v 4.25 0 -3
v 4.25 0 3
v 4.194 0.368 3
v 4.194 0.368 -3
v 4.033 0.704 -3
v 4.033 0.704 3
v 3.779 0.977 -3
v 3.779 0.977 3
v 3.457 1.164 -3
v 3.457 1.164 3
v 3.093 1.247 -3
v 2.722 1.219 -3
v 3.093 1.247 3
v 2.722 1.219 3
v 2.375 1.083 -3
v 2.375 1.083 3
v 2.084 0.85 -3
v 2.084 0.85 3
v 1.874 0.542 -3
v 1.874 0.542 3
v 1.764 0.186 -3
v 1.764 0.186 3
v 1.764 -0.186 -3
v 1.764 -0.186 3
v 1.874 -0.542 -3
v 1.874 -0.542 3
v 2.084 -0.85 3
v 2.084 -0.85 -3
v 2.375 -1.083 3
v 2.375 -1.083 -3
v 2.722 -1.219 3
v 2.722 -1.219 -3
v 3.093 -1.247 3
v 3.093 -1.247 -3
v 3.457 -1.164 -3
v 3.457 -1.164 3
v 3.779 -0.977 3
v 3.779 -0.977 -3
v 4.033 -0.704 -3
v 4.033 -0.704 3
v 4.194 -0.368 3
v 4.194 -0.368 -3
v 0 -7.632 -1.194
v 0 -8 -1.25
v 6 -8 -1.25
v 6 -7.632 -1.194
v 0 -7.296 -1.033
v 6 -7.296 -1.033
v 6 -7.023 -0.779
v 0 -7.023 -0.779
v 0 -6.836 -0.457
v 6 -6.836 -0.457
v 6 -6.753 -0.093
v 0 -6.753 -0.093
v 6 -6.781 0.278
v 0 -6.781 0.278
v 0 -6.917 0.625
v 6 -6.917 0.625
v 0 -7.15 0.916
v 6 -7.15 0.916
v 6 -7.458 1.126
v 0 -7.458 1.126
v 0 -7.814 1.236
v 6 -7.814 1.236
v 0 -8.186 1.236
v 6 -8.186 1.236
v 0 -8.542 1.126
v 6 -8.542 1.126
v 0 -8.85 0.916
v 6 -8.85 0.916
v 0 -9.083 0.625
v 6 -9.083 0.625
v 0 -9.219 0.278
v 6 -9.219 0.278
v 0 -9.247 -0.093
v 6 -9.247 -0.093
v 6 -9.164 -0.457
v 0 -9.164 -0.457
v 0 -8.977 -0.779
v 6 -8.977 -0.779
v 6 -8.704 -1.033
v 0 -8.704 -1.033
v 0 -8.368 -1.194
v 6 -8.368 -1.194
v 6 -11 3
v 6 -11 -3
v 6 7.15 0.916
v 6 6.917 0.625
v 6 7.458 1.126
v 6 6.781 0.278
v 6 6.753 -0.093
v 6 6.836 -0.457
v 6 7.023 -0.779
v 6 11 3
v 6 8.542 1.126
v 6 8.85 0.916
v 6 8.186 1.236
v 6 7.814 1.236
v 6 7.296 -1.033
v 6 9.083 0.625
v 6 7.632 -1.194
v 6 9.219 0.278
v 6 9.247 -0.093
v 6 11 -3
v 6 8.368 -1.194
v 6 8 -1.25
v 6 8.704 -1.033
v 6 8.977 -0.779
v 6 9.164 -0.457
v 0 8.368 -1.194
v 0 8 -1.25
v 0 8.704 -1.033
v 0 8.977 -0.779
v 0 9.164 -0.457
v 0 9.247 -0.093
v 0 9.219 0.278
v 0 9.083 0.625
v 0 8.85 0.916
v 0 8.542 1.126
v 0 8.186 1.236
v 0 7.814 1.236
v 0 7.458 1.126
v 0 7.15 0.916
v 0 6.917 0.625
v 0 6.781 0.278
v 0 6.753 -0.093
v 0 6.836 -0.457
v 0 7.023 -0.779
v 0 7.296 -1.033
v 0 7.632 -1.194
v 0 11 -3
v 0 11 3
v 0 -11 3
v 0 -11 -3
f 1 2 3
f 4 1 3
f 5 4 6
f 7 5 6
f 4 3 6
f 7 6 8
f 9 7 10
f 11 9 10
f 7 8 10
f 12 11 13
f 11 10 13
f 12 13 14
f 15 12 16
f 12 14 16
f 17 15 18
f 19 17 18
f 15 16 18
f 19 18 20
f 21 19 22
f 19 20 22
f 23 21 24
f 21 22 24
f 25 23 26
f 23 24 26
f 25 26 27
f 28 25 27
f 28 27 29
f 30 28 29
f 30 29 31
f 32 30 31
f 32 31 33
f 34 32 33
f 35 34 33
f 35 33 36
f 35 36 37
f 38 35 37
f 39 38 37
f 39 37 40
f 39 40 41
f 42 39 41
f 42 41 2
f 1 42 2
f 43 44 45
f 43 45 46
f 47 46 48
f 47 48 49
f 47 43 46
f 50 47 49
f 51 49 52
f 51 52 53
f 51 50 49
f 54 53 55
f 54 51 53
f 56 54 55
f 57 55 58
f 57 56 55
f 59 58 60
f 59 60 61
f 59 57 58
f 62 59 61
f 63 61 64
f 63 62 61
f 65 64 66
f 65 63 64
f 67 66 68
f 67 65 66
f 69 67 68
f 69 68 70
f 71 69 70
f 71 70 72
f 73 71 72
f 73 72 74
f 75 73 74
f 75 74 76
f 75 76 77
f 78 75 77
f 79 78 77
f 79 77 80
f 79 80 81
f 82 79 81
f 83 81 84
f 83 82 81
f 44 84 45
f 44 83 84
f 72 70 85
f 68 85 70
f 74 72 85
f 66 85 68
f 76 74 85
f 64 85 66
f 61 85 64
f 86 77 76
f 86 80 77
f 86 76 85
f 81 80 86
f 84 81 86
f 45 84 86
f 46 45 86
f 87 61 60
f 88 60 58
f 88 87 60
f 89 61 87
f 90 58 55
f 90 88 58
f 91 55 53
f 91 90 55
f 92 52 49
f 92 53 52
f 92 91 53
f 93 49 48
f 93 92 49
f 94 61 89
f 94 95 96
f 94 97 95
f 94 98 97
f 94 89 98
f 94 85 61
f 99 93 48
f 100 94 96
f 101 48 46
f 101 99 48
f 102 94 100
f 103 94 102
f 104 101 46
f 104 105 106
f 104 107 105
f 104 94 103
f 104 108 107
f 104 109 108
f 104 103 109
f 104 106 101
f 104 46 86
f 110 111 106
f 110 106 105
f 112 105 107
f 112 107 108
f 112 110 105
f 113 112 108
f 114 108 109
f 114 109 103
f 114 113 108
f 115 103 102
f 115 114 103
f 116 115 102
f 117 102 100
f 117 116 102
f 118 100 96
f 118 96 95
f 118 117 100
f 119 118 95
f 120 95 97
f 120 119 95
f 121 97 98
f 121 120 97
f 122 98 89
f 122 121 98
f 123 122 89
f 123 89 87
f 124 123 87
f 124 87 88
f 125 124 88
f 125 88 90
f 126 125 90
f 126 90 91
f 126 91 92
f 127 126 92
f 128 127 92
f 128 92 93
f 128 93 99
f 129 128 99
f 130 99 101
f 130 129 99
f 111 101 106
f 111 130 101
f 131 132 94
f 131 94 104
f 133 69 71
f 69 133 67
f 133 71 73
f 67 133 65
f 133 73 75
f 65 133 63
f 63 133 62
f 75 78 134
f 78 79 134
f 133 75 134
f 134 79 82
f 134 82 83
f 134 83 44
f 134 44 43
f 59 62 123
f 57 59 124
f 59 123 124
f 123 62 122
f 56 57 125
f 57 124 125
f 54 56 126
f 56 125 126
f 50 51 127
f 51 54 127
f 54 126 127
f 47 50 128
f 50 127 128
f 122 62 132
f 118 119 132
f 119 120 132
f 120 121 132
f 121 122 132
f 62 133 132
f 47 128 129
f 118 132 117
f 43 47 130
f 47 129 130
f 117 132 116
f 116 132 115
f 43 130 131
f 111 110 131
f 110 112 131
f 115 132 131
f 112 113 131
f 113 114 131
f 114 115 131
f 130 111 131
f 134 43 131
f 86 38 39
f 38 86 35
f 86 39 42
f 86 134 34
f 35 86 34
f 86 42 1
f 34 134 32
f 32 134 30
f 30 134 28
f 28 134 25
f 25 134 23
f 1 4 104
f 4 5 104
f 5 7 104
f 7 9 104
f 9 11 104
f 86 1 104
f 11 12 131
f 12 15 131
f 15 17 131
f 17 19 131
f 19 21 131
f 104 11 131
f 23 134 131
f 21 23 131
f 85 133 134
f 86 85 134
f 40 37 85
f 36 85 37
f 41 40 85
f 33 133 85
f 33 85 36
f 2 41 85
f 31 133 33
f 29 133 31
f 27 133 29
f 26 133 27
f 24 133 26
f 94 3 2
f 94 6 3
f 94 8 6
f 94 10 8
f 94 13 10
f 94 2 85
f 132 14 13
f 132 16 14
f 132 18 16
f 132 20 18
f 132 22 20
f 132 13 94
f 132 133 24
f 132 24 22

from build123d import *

# Parameters (mm, degrees)
SKETCH_1_W          = 6
SKETCH_1_H          = 22
SKETCH_1_R          = 1.25
EXTRUDE_1_DEPTH     = 6
SKETCH_2_R          = 1.25
CUT_EXTRUDE_1_DEPTH = 7


with BuildPart() as part:
    # 草图1 → 凸台-拉伸1 (new body)
    with BuildSketch(Plane(origin=(0, 0, 0), x_dir=(0, 0, -1), z_dir=(1, 0, 0))):
        Rectangle(SKETCH_1_W, SKETCH_1_H)
        with Locations((0, 8)):
            Circle(SKETCH_1_R, mode=Mode.SUBTRACT)
        with Locations((0, -8)):
            Circle(SKETCH_1_R, mode=Mode.SUBTRACT)
    extrude(amount=EXTRUDE_1_DEPTH)

    # 草图2 → 切除-拉伸1 (cut, through all)
    with BuildSketch(Plane.XY.offset(3)):
        with Locations((3, 0)):
            Circle(SKETCH_2_R)
    extrude(amount=-CUT_EXTRUDE_1_DEPTH, mode=Mode.SUBTRACT)


solid = part.part
